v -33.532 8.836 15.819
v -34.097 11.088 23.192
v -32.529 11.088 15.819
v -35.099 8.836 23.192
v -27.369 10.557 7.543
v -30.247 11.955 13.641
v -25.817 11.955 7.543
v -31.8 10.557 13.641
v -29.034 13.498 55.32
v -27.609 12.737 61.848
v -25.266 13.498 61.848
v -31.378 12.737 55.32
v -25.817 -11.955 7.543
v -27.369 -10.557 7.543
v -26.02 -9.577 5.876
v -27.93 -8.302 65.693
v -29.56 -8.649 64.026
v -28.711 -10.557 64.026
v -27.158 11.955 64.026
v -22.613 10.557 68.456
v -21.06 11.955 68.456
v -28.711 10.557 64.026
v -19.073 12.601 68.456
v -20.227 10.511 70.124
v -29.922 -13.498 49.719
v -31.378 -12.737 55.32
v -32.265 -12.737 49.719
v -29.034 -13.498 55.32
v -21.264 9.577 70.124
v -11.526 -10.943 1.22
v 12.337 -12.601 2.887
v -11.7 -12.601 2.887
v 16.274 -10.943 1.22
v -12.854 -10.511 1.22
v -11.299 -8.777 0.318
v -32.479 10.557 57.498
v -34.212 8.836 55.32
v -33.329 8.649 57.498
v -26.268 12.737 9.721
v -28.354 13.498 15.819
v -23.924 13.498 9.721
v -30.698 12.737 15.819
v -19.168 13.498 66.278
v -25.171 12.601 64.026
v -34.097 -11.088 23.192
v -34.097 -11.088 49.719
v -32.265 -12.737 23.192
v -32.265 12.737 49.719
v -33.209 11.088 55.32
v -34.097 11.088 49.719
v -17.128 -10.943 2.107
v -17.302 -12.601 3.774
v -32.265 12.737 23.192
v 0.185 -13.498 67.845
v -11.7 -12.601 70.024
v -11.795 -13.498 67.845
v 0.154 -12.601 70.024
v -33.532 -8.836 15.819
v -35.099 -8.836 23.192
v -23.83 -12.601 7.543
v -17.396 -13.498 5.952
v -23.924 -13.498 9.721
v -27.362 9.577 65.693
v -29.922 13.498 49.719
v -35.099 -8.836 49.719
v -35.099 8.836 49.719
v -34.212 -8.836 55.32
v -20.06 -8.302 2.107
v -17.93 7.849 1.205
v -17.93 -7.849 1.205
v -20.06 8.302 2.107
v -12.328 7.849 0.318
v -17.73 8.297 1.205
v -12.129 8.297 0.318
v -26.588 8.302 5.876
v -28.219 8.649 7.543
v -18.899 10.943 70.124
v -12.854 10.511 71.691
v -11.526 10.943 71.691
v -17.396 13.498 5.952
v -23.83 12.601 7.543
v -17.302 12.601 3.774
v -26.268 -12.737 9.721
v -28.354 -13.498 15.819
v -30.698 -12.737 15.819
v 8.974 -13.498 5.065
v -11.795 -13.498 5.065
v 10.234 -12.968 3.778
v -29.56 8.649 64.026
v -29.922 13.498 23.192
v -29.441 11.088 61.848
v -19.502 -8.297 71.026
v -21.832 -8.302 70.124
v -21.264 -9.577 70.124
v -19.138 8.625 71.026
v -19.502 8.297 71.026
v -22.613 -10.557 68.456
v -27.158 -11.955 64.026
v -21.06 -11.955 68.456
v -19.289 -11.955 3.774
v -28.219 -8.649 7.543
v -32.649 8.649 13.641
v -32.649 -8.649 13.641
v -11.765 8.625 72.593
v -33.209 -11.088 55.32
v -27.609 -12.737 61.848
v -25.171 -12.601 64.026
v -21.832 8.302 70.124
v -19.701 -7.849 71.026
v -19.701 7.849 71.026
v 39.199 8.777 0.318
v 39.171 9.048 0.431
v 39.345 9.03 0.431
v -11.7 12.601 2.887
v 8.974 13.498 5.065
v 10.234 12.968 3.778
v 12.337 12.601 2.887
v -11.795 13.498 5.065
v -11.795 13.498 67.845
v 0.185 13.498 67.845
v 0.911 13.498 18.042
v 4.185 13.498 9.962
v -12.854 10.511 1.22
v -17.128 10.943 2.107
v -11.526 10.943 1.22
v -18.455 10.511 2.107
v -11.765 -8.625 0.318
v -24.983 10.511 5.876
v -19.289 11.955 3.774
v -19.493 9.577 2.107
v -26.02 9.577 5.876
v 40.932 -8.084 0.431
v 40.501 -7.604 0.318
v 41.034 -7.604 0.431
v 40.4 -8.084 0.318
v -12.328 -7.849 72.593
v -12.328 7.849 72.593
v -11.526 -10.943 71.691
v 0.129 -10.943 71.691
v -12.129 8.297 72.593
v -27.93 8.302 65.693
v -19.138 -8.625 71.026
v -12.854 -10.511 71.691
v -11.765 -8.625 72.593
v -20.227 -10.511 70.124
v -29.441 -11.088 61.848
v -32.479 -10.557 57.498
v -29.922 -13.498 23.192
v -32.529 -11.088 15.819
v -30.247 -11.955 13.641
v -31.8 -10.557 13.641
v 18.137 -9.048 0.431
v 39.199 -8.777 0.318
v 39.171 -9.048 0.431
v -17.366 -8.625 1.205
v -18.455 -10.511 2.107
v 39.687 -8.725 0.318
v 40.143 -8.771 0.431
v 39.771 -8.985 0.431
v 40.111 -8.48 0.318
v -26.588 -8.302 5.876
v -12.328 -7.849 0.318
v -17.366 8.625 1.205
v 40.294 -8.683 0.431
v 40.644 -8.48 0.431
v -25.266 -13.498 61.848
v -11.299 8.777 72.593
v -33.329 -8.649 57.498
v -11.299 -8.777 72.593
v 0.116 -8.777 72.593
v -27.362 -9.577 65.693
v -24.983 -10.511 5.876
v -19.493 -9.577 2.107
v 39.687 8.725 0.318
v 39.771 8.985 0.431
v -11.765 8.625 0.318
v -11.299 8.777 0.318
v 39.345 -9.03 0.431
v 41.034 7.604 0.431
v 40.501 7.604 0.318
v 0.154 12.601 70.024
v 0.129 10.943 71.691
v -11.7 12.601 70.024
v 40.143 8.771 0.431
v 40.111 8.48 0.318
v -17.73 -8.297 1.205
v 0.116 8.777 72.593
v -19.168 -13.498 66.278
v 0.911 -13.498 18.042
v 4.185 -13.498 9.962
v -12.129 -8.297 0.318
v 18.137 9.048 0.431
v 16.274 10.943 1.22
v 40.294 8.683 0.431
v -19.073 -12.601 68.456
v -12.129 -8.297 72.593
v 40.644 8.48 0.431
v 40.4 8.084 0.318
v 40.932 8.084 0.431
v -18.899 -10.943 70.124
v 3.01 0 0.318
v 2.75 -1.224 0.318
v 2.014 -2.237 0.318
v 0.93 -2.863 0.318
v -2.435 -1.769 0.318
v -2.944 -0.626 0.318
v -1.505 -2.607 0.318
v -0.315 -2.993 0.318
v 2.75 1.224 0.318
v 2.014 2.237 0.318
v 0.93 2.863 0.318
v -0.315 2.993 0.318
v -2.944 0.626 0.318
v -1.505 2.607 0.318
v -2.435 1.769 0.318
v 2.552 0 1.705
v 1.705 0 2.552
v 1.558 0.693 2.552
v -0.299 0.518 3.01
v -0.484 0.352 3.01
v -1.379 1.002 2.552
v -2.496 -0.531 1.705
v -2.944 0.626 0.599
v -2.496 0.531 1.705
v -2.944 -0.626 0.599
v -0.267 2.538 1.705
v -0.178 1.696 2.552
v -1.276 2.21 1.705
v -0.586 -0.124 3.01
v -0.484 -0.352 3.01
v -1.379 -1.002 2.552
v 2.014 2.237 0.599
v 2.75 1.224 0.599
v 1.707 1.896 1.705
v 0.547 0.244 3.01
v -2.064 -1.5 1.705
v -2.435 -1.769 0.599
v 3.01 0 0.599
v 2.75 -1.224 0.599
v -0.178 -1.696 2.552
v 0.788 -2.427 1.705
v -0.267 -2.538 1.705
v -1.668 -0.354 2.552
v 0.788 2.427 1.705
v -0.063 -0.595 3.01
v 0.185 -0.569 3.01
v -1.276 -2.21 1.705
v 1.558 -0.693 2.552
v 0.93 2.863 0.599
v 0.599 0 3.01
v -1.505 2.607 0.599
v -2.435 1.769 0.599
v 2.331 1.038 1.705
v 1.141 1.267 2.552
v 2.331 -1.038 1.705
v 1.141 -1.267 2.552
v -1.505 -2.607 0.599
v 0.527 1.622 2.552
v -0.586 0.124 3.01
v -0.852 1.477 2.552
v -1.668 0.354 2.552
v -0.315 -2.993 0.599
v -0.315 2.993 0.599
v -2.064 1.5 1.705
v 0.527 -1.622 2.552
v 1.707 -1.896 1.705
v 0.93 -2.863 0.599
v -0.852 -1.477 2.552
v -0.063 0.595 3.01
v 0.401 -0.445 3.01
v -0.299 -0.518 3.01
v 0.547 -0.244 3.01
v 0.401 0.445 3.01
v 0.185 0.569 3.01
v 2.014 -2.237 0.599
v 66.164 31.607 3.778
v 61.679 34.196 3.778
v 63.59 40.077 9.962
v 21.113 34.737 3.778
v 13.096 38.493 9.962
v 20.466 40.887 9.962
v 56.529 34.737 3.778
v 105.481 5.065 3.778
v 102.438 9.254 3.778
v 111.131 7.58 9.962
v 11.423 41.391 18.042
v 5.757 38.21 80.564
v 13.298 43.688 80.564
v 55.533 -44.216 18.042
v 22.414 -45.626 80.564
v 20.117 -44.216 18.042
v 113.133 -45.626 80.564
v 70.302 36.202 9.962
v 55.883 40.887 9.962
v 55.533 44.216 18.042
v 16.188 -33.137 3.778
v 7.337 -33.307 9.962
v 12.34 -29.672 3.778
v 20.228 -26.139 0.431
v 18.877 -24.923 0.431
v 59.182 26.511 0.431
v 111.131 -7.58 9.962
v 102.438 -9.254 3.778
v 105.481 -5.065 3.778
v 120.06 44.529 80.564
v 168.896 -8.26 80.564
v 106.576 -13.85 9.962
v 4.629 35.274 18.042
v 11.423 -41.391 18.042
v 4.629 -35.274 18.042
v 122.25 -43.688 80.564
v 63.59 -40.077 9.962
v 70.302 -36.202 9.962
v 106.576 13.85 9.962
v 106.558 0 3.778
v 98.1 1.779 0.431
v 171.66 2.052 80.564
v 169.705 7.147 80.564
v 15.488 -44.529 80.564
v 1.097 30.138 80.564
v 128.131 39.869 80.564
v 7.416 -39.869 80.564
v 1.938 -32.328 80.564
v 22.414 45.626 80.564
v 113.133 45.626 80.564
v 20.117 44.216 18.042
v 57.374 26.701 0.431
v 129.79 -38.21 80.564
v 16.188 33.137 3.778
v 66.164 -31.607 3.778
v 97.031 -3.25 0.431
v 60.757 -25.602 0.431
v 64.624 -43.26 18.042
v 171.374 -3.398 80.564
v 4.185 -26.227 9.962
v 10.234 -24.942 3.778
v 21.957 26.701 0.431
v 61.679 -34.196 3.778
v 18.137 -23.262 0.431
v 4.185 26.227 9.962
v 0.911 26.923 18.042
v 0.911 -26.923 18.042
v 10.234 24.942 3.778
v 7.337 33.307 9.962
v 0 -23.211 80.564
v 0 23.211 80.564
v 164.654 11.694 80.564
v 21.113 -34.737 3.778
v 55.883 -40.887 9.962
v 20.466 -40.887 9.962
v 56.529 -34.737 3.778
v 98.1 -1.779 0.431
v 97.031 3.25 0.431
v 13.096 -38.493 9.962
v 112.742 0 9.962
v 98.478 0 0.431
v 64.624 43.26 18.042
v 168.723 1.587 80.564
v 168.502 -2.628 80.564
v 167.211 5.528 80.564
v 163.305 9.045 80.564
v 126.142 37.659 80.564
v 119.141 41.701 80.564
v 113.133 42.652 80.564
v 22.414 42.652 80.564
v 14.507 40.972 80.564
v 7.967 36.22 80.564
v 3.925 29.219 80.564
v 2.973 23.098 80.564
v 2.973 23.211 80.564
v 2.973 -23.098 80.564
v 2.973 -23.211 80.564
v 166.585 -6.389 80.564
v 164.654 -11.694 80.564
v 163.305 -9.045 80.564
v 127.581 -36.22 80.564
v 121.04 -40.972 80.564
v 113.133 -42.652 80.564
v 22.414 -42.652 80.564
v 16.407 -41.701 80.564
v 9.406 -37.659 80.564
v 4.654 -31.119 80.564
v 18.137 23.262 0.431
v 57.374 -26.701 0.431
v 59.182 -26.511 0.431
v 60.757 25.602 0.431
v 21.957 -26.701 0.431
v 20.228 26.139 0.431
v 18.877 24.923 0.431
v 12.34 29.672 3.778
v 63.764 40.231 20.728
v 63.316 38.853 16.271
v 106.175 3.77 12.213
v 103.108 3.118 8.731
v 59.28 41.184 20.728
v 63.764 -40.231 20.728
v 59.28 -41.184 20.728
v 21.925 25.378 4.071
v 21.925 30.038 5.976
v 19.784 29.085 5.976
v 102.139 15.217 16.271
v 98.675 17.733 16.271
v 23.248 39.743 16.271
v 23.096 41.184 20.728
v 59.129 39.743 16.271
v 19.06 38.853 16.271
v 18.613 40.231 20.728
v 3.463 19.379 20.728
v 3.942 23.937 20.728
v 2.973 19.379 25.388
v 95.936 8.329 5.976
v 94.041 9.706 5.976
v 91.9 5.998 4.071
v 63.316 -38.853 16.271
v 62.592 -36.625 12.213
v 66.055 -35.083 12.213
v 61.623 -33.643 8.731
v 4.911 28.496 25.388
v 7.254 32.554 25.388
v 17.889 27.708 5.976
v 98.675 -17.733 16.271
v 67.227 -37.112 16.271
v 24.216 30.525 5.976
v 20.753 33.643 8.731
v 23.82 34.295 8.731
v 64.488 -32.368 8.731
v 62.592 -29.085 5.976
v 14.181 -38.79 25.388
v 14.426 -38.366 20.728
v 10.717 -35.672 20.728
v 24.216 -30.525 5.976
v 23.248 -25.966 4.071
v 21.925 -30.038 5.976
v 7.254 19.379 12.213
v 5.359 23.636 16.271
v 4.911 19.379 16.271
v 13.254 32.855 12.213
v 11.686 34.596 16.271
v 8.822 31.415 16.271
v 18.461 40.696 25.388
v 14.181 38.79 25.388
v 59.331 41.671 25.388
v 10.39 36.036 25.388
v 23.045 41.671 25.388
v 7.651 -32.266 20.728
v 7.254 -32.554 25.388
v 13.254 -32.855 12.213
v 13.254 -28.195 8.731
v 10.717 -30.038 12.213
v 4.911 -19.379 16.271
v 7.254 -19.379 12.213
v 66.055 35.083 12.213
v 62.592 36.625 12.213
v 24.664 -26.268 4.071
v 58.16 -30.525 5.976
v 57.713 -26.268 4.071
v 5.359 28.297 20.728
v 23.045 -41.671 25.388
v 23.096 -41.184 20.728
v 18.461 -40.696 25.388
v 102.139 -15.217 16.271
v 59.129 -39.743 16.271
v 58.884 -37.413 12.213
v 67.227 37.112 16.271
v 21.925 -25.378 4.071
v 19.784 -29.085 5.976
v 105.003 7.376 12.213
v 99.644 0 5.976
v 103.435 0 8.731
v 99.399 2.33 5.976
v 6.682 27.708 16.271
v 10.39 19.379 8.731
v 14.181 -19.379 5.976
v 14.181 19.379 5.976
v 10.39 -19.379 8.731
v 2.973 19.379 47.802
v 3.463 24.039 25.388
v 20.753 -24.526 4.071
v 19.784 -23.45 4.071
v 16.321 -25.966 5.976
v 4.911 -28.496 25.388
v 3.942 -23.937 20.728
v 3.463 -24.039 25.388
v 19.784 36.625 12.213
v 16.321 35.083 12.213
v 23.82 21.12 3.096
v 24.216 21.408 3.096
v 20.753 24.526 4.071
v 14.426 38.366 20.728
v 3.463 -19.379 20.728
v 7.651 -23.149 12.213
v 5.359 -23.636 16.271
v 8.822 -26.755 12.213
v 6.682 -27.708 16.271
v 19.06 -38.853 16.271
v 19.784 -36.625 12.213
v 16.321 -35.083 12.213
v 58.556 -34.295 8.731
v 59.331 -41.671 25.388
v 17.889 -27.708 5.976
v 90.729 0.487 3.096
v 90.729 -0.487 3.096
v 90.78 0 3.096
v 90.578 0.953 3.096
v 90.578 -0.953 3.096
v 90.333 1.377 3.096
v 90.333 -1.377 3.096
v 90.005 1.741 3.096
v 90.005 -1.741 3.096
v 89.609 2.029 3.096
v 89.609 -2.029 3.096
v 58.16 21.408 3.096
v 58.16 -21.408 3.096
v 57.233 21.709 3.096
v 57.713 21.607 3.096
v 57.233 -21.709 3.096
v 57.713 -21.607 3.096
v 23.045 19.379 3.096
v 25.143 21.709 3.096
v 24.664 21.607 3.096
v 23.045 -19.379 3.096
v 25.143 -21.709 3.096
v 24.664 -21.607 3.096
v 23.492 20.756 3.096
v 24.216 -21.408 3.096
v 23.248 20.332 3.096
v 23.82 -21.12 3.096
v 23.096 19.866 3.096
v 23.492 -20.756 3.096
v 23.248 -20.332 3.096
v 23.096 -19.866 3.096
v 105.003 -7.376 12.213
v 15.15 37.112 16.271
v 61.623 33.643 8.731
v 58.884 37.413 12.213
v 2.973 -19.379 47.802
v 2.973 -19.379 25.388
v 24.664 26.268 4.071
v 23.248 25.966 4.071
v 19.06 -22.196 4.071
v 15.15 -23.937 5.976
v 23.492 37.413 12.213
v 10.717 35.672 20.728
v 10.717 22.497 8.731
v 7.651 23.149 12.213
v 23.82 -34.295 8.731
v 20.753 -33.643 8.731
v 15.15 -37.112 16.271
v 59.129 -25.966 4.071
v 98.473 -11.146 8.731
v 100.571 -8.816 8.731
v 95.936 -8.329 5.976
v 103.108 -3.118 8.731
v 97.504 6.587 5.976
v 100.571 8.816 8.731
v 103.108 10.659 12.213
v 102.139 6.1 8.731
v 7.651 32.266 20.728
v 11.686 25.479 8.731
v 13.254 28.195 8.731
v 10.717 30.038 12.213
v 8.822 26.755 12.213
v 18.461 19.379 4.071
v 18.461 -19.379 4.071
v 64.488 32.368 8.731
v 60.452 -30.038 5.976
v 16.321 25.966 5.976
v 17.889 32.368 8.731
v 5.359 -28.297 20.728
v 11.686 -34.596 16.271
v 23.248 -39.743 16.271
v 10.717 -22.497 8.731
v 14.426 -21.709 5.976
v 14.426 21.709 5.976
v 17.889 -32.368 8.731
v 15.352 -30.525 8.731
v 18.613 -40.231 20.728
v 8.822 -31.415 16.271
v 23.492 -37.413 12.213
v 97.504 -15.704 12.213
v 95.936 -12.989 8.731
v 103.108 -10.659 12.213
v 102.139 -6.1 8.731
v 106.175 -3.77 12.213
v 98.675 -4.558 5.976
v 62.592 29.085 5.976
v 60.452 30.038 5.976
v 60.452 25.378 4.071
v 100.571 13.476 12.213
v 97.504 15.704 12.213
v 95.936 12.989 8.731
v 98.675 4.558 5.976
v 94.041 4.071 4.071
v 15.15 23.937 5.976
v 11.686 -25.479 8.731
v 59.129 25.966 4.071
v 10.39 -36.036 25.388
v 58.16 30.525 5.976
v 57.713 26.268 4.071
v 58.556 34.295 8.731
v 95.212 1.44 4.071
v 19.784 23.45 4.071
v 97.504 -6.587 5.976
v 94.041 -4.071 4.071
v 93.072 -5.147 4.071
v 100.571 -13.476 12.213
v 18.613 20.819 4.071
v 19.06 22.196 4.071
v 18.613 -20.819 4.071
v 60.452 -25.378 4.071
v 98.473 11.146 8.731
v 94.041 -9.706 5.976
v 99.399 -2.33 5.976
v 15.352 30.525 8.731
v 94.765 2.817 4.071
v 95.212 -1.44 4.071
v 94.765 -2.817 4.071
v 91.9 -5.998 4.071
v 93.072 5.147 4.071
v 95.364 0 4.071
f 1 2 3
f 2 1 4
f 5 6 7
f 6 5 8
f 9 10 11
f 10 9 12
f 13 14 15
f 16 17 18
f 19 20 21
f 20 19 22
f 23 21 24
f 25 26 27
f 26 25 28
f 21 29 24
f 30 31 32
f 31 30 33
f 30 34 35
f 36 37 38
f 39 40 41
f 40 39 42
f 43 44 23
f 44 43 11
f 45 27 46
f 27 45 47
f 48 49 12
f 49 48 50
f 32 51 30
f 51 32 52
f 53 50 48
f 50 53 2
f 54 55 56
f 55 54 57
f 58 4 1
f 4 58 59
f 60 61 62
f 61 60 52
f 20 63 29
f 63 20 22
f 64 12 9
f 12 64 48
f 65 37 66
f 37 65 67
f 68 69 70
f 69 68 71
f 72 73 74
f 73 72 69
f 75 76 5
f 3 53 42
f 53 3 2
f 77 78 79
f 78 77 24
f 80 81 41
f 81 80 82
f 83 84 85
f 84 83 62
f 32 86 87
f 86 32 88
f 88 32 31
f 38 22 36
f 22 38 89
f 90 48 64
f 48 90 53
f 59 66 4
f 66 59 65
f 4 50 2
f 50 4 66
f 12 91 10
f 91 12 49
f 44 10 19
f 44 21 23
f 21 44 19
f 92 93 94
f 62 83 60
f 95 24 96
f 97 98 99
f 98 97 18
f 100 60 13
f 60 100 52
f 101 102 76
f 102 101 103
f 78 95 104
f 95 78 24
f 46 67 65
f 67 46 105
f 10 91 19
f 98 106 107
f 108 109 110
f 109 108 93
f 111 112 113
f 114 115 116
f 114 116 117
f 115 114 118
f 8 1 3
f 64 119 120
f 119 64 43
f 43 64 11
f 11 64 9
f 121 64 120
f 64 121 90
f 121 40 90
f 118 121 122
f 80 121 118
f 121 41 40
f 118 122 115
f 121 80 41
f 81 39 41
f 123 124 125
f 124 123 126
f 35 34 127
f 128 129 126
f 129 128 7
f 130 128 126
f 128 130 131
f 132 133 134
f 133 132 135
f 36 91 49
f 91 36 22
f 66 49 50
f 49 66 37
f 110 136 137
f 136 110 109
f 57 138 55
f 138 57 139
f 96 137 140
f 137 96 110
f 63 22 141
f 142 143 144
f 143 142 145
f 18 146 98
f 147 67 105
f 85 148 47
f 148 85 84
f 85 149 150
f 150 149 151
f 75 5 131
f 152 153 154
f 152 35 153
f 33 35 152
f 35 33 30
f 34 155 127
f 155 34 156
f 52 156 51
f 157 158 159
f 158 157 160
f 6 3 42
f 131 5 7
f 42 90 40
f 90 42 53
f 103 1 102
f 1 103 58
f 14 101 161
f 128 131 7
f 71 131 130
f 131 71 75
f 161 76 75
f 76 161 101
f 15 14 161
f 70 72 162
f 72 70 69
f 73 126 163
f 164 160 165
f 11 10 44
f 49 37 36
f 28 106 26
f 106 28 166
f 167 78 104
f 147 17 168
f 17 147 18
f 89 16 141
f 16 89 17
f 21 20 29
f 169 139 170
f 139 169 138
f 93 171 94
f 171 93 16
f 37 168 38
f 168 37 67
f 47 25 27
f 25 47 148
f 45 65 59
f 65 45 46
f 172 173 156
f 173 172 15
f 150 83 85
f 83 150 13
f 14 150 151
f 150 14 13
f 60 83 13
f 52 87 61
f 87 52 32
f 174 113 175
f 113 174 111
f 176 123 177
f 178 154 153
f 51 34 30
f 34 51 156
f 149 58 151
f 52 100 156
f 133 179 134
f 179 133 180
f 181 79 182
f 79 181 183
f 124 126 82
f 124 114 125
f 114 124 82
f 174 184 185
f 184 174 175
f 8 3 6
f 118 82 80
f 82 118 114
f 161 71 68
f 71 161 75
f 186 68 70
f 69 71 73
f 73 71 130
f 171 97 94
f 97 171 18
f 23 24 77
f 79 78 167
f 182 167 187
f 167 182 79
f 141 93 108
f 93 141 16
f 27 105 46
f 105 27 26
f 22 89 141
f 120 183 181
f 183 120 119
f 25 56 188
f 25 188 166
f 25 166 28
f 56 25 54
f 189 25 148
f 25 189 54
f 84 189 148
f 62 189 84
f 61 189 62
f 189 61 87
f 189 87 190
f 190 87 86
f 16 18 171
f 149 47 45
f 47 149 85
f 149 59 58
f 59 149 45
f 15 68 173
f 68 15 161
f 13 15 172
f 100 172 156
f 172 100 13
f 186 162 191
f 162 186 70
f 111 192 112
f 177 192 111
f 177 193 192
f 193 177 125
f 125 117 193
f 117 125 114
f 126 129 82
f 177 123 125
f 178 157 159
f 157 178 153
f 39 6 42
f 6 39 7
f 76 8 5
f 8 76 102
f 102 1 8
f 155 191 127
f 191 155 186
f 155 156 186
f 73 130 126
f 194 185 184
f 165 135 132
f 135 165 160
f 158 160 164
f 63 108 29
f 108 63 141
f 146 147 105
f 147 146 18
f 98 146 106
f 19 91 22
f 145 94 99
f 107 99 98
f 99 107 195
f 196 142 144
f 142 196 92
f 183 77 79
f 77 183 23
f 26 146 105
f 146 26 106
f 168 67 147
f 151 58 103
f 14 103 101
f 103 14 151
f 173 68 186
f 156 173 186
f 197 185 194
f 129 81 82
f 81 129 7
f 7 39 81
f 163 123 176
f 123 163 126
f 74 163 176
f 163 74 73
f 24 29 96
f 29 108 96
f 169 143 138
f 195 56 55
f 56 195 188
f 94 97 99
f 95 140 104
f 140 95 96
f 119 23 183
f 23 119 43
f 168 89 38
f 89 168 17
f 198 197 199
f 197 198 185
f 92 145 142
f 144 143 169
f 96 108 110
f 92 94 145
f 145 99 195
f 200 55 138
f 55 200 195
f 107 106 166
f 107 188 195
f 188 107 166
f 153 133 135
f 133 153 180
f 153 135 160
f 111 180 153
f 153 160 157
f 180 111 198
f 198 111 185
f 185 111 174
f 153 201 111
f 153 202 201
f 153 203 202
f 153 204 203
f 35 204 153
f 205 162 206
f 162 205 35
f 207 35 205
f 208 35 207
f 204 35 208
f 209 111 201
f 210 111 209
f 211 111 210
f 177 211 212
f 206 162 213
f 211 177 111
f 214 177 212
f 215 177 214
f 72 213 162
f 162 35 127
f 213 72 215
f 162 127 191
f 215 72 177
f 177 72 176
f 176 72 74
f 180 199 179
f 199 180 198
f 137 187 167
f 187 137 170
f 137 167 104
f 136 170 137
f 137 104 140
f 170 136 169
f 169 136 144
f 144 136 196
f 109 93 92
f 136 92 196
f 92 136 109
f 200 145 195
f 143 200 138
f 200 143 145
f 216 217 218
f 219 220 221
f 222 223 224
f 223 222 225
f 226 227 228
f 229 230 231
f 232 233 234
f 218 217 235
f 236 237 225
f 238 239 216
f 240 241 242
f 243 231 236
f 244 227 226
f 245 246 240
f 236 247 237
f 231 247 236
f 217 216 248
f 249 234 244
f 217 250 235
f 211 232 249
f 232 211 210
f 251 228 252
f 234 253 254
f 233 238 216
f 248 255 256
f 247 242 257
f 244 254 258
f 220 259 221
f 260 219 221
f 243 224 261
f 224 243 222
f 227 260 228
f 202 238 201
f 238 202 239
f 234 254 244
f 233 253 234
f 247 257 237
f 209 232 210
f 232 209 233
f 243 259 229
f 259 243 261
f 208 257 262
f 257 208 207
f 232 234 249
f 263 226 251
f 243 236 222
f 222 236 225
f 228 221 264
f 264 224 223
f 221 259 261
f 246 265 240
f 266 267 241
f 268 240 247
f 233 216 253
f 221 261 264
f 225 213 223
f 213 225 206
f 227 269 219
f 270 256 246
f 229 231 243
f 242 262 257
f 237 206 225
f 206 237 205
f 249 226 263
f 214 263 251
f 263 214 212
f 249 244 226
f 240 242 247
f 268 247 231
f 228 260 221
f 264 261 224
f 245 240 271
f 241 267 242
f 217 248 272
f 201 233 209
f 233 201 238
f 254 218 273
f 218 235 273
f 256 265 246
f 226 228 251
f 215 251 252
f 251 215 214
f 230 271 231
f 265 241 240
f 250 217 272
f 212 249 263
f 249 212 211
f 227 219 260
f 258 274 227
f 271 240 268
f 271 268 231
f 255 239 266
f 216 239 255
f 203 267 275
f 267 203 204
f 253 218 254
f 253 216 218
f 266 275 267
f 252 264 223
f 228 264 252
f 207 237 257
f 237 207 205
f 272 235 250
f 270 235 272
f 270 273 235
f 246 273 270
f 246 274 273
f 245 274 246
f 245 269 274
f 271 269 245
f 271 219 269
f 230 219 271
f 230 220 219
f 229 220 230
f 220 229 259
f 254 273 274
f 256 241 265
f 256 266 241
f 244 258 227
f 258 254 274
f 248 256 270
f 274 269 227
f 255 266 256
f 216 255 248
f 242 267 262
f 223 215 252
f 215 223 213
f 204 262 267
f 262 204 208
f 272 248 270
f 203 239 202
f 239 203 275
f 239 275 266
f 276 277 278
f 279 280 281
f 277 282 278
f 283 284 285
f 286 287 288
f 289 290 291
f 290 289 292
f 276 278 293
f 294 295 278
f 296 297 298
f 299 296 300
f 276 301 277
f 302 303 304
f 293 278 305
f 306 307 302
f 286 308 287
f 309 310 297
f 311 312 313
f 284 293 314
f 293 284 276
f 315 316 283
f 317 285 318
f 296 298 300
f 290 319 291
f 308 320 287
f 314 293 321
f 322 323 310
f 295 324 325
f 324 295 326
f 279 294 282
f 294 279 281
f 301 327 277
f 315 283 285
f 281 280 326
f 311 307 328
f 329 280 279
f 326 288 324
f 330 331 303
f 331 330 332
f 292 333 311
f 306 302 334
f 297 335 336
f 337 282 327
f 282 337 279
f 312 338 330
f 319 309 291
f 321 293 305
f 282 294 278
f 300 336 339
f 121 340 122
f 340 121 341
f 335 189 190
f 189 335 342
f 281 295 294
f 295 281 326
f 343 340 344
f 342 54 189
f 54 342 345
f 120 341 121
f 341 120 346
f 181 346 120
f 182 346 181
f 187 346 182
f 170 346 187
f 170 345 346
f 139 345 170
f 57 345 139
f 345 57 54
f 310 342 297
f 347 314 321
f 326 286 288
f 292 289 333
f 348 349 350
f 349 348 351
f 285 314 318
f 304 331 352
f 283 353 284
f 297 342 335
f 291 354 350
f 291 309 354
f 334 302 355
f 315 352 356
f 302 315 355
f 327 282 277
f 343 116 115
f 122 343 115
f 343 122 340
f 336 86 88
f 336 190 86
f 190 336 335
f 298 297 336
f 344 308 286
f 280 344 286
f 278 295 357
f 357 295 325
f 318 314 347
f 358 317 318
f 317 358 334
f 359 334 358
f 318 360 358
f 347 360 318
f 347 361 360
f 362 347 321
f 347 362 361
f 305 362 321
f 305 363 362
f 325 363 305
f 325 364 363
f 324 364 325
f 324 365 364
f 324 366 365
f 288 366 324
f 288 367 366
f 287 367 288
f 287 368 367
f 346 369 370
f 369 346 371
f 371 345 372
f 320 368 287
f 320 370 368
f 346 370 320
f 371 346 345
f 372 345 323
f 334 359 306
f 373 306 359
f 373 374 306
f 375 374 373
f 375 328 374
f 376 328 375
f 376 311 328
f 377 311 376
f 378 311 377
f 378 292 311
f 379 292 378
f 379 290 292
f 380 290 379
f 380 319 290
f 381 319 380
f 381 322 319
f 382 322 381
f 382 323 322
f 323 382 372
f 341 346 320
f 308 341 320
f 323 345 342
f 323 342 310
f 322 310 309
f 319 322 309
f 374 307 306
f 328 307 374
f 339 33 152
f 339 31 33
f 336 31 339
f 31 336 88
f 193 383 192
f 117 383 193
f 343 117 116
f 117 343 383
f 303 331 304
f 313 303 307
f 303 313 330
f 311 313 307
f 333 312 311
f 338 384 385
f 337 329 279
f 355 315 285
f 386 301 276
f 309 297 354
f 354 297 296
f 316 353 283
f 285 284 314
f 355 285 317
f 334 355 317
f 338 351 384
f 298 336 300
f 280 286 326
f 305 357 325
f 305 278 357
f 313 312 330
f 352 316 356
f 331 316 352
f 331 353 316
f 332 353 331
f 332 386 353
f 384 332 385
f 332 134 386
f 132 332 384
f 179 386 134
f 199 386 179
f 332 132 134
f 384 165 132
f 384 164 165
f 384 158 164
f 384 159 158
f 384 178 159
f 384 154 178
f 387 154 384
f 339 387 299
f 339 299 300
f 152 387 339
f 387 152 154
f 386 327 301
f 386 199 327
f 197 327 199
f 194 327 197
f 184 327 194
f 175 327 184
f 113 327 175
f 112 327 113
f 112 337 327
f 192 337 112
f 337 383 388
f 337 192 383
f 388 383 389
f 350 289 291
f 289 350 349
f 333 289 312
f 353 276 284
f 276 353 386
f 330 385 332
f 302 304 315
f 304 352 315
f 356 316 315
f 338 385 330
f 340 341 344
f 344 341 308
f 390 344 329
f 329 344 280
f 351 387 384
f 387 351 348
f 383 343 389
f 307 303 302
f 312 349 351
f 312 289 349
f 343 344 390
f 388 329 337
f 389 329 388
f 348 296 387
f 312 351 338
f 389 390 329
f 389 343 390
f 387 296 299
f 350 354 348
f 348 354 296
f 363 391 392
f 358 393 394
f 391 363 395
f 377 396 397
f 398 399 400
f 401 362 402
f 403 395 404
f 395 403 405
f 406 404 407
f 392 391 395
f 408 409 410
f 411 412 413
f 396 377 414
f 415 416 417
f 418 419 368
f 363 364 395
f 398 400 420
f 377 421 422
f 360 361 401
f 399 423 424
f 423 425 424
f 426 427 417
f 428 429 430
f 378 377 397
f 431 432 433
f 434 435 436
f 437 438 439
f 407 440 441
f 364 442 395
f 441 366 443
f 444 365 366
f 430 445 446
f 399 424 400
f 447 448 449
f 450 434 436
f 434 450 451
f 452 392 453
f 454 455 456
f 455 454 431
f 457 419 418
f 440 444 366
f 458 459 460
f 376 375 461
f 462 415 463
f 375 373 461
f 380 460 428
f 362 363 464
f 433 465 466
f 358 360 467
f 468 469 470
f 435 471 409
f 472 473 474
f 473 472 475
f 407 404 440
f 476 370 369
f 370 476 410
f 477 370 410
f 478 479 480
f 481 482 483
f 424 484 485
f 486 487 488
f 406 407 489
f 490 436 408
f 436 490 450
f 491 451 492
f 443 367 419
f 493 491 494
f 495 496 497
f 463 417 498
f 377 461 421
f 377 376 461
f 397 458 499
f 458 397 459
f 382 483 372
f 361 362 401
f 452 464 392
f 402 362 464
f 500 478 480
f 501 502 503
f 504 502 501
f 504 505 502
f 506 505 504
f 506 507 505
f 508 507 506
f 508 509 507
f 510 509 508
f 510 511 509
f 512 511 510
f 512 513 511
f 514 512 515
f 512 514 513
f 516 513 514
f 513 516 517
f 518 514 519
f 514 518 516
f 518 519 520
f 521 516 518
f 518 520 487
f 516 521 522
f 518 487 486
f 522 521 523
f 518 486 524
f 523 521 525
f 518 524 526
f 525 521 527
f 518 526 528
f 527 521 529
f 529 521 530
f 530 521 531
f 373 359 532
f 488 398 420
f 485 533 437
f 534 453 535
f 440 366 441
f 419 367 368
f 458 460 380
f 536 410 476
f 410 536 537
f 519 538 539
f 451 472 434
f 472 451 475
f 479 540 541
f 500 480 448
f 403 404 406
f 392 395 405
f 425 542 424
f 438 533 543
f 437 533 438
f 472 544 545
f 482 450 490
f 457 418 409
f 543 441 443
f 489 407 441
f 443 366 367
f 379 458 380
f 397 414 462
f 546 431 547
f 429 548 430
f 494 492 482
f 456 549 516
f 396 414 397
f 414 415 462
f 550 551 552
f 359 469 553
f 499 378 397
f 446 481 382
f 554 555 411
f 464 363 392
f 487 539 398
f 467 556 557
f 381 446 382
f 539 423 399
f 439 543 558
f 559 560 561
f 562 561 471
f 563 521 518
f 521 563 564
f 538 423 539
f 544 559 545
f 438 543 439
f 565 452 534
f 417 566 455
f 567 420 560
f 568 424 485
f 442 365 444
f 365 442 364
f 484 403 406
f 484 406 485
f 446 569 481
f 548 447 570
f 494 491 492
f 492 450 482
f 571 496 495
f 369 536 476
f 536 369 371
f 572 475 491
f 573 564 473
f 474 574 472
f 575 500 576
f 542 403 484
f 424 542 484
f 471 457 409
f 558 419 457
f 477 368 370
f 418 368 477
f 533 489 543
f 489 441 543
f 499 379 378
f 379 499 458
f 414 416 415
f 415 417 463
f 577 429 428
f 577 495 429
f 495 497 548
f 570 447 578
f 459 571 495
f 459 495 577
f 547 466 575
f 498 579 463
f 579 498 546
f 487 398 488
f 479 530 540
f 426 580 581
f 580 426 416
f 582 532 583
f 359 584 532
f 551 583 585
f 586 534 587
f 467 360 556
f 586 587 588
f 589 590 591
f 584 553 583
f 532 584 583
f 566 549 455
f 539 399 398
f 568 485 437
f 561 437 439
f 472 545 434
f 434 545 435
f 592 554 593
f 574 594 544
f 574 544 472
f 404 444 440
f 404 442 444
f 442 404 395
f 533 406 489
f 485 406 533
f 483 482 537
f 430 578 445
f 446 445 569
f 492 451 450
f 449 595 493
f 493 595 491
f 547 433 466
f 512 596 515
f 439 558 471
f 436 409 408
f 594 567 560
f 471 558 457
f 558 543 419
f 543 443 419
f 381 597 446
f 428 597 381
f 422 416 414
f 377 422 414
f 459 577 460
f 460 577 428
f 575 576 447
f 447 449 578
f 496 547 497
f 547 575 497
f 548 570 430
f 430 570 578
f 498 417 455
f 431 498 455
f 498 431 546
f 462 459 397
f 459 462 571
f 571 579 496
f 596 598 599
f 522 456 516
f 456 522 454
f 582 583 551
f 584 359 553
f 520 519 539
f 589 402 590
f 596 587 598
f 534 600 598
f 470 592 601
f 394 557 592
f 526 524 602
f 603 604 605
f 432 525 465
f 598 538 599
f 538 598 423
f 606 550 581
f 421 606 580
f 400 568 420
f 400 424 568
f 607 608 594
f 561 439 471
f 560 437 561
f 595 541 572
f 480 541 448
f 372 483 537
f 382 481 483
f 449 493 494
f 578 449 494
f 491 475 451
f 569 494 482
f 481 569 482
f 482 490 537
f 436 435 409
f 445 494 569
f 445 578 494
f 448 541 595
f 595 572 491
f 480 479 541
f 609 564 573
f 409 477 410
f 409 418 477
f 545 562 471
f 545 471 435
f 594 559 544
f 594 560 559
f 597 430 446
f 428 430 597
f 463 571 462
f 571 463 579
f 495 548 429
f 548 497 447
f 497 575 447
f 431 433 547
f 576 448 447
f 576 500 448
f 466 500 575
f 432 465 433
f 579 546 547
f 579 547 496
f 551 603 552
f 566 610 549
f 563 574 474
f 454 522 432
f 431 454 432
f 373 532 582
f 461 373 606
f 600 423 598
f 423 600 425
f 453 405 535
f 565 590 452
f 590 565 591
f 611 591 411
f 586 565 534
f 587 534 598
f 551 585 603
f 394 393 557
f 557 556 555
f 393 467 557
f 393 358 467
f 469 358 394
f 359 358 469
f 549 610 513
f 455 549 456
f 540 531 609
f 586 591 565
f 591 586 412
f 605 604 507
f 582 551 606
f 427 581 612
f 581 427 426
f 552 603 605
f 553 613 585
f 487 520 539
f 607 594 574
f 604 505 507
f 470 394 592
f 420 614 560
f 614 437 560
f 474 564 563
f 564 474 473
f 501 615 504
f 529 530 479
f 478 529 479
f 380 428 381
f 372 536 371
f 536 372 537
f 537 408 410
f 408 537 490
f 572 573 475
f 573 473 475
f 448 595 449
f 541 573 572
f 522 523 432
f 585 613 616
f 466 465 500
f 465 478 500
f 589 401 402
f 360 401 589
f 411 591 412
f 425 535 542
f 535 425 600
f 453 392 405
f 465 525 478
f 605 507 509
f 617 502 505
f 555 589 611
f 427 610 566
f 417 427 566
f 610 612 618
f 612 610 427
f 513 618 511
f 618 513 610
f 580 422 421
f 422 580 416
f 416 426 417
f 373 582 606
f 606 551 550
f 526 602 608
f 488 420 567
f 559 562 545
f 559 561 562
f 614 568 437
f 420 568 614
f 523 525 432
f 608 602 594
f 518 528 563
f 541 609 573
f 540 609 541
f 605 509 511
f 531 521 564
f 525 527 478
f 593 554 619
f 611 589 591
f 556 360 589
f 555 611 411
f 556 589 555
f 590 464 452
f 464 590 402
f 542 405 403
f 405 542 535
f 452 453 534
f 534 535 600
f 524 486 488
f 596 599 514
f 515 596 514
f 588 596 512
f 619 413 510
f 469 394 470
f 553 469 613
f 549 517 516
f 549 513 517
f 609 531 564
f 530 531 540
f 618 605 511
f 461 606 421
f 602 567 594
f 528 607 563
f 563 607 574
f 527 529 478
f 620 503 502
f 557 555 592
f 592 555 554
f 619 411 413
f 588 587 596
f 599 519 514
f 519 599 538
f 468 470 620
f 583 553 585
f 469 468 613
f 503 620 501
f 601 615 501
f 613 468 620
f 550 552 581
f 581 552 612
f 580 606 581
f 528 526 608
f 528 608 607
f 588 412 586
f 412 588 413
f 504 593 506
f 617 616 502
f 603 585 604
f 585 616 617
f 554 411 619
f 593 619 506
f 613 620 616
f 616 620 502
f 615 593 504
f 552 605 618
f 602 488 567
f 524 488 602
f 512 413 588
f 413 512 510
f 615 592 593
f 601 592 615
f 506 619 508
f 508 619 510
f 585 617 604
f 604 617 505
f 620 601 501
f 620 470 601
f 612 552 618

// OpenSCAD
//Length
l=200;
//Width 
b=140;
//Height
h=90;
//Spout horizontal undercut 
piph=40;
//Spout vertical undercut 
pipv=30;
//Spout rounding 
pipr=5;
//Sides undercut
su=10;
//Rounding
radie=10;
//Wall thickness
vagg= 1;
//Handle lenght multiplier
hlm=1;
// Detail
fn=15;


l=rnd(100,300);
b=rnd(l/2,l);
h=rnd(b/3,l);
piph=rnd(1,l/3);
pipv=rnd(1,l/3);
su=rnd(0,rnd(0,b/2));
pipr=rnd(1,min(l,b,h)/3);
radie=rnd(1,min(l,b,h)/3);
vagg= rnd(min(l,b,h)/30,min(l,b,h)/20);
 hlm=rnd(0.5,rnd(1,4));
 

//Handle
handtag=1;//[0,1]

/* [Hidden] */
 r=min(radie,h/4);

botten=[[0+radie,b/2-radie-su],[0+radie,-b/2+radie+su],[l-pipv-piph-radie,-b/2+radie+su],[l-pipv-radie,0],[l-pipv-piph-radie,b/2-radie-su]];

topp =[[0+radie,b/2-radie],[0+radie,-b/2+radie],[l-piph-radie,-b/2+radie] ,[l-piph-radie,b/2-radie]];
pip =[ [l-piph-radie,-b/2+radie],[l-pipr,0],[l-piph-radie,b/2-radie]];
 $fn=fn;
difference(){ 
union(){
if(handtag==1){
difference(){
union() {

 

minkowski(){ 
translate([-max(r*1.1,h/1.6180-r)*hlm+(r*3),0,h-r*0.38]*0.5-[vagg,0 ,0]){
rotate([90,0,0])linear_extrude(b/6,center=true)offset(r=r*0.9)offset(r=-r*0.9)square([max(r*1.1,h/1.6180-r)*hlm+r*3,max(radie,h-r)],center=true);}

sphere(r*0.3);}
}

union() {
translate([-max(r*1.1,h/1.6180-r)*hlm,0,h-r*0.38]*0.5-[vagg,0 ,0]){
rotate([90,0,0])linear_extrude(b,center=true)offset(r=r)offset(r=-r )square([max(r*1.1,h/1.6180-r-vagg)*hlm,max(r,h-r-vagg)],center=true);}}

minkowski(){ 

translate([-max(r*1.1,h/1.6180-r)*hlm,0,h-r*0.38]*0.5-[vagg,0 ,0]){
rotate([90,0,0])linear_extrude(b/6-vagg,center=true)offset(r=r*0.9)offset(r=-r*0.9)square([max(r*1.1,h/1.6180-r)*hlm,max(r,h-r)],center=true);}
 

sphere(r*0.3-vagg);}

}}


  union(){

hull()                                  {
minkowski(){translate([0,0,radie])linear_extrude(1e-16) polygon(botten);difference(){
sphere(radie);cylinder(radie,radie,radie);}
}

translate([0,0,h])linear_extrude(1e-16)offset(r=radie) polygon(topp);
translate([0,0,h])linear_extrude(1e-16)offset(r=pipr) polygon(pip);
}

 }

 }
 
union(){
hull()                                  {
minkowski(){translate([0,0,radie+vagg])linear_extrude(1e-16) offset(r= -vagg)polygon(botten);union(){
$fn=fn*2;
sphere(radie);cylinder(radie,radie,radie);}
}
translate([0,0,h])linear_extrude(1) offset(r=radie -vagg)polygon(topp);
translate([0,0,h])linear_extrude(1e-16)offset(r=pipr-vagg) polygon(pip);

}


}

  }


function rnd(a = 1, b = 0, s = []) = 
  s == [] ? 
   (rands(min(a, b), max(   a, b), 1)[0]) 
  : 
   (rands(min(a, b), max(a, b), 1, s)[0])
  ; 
